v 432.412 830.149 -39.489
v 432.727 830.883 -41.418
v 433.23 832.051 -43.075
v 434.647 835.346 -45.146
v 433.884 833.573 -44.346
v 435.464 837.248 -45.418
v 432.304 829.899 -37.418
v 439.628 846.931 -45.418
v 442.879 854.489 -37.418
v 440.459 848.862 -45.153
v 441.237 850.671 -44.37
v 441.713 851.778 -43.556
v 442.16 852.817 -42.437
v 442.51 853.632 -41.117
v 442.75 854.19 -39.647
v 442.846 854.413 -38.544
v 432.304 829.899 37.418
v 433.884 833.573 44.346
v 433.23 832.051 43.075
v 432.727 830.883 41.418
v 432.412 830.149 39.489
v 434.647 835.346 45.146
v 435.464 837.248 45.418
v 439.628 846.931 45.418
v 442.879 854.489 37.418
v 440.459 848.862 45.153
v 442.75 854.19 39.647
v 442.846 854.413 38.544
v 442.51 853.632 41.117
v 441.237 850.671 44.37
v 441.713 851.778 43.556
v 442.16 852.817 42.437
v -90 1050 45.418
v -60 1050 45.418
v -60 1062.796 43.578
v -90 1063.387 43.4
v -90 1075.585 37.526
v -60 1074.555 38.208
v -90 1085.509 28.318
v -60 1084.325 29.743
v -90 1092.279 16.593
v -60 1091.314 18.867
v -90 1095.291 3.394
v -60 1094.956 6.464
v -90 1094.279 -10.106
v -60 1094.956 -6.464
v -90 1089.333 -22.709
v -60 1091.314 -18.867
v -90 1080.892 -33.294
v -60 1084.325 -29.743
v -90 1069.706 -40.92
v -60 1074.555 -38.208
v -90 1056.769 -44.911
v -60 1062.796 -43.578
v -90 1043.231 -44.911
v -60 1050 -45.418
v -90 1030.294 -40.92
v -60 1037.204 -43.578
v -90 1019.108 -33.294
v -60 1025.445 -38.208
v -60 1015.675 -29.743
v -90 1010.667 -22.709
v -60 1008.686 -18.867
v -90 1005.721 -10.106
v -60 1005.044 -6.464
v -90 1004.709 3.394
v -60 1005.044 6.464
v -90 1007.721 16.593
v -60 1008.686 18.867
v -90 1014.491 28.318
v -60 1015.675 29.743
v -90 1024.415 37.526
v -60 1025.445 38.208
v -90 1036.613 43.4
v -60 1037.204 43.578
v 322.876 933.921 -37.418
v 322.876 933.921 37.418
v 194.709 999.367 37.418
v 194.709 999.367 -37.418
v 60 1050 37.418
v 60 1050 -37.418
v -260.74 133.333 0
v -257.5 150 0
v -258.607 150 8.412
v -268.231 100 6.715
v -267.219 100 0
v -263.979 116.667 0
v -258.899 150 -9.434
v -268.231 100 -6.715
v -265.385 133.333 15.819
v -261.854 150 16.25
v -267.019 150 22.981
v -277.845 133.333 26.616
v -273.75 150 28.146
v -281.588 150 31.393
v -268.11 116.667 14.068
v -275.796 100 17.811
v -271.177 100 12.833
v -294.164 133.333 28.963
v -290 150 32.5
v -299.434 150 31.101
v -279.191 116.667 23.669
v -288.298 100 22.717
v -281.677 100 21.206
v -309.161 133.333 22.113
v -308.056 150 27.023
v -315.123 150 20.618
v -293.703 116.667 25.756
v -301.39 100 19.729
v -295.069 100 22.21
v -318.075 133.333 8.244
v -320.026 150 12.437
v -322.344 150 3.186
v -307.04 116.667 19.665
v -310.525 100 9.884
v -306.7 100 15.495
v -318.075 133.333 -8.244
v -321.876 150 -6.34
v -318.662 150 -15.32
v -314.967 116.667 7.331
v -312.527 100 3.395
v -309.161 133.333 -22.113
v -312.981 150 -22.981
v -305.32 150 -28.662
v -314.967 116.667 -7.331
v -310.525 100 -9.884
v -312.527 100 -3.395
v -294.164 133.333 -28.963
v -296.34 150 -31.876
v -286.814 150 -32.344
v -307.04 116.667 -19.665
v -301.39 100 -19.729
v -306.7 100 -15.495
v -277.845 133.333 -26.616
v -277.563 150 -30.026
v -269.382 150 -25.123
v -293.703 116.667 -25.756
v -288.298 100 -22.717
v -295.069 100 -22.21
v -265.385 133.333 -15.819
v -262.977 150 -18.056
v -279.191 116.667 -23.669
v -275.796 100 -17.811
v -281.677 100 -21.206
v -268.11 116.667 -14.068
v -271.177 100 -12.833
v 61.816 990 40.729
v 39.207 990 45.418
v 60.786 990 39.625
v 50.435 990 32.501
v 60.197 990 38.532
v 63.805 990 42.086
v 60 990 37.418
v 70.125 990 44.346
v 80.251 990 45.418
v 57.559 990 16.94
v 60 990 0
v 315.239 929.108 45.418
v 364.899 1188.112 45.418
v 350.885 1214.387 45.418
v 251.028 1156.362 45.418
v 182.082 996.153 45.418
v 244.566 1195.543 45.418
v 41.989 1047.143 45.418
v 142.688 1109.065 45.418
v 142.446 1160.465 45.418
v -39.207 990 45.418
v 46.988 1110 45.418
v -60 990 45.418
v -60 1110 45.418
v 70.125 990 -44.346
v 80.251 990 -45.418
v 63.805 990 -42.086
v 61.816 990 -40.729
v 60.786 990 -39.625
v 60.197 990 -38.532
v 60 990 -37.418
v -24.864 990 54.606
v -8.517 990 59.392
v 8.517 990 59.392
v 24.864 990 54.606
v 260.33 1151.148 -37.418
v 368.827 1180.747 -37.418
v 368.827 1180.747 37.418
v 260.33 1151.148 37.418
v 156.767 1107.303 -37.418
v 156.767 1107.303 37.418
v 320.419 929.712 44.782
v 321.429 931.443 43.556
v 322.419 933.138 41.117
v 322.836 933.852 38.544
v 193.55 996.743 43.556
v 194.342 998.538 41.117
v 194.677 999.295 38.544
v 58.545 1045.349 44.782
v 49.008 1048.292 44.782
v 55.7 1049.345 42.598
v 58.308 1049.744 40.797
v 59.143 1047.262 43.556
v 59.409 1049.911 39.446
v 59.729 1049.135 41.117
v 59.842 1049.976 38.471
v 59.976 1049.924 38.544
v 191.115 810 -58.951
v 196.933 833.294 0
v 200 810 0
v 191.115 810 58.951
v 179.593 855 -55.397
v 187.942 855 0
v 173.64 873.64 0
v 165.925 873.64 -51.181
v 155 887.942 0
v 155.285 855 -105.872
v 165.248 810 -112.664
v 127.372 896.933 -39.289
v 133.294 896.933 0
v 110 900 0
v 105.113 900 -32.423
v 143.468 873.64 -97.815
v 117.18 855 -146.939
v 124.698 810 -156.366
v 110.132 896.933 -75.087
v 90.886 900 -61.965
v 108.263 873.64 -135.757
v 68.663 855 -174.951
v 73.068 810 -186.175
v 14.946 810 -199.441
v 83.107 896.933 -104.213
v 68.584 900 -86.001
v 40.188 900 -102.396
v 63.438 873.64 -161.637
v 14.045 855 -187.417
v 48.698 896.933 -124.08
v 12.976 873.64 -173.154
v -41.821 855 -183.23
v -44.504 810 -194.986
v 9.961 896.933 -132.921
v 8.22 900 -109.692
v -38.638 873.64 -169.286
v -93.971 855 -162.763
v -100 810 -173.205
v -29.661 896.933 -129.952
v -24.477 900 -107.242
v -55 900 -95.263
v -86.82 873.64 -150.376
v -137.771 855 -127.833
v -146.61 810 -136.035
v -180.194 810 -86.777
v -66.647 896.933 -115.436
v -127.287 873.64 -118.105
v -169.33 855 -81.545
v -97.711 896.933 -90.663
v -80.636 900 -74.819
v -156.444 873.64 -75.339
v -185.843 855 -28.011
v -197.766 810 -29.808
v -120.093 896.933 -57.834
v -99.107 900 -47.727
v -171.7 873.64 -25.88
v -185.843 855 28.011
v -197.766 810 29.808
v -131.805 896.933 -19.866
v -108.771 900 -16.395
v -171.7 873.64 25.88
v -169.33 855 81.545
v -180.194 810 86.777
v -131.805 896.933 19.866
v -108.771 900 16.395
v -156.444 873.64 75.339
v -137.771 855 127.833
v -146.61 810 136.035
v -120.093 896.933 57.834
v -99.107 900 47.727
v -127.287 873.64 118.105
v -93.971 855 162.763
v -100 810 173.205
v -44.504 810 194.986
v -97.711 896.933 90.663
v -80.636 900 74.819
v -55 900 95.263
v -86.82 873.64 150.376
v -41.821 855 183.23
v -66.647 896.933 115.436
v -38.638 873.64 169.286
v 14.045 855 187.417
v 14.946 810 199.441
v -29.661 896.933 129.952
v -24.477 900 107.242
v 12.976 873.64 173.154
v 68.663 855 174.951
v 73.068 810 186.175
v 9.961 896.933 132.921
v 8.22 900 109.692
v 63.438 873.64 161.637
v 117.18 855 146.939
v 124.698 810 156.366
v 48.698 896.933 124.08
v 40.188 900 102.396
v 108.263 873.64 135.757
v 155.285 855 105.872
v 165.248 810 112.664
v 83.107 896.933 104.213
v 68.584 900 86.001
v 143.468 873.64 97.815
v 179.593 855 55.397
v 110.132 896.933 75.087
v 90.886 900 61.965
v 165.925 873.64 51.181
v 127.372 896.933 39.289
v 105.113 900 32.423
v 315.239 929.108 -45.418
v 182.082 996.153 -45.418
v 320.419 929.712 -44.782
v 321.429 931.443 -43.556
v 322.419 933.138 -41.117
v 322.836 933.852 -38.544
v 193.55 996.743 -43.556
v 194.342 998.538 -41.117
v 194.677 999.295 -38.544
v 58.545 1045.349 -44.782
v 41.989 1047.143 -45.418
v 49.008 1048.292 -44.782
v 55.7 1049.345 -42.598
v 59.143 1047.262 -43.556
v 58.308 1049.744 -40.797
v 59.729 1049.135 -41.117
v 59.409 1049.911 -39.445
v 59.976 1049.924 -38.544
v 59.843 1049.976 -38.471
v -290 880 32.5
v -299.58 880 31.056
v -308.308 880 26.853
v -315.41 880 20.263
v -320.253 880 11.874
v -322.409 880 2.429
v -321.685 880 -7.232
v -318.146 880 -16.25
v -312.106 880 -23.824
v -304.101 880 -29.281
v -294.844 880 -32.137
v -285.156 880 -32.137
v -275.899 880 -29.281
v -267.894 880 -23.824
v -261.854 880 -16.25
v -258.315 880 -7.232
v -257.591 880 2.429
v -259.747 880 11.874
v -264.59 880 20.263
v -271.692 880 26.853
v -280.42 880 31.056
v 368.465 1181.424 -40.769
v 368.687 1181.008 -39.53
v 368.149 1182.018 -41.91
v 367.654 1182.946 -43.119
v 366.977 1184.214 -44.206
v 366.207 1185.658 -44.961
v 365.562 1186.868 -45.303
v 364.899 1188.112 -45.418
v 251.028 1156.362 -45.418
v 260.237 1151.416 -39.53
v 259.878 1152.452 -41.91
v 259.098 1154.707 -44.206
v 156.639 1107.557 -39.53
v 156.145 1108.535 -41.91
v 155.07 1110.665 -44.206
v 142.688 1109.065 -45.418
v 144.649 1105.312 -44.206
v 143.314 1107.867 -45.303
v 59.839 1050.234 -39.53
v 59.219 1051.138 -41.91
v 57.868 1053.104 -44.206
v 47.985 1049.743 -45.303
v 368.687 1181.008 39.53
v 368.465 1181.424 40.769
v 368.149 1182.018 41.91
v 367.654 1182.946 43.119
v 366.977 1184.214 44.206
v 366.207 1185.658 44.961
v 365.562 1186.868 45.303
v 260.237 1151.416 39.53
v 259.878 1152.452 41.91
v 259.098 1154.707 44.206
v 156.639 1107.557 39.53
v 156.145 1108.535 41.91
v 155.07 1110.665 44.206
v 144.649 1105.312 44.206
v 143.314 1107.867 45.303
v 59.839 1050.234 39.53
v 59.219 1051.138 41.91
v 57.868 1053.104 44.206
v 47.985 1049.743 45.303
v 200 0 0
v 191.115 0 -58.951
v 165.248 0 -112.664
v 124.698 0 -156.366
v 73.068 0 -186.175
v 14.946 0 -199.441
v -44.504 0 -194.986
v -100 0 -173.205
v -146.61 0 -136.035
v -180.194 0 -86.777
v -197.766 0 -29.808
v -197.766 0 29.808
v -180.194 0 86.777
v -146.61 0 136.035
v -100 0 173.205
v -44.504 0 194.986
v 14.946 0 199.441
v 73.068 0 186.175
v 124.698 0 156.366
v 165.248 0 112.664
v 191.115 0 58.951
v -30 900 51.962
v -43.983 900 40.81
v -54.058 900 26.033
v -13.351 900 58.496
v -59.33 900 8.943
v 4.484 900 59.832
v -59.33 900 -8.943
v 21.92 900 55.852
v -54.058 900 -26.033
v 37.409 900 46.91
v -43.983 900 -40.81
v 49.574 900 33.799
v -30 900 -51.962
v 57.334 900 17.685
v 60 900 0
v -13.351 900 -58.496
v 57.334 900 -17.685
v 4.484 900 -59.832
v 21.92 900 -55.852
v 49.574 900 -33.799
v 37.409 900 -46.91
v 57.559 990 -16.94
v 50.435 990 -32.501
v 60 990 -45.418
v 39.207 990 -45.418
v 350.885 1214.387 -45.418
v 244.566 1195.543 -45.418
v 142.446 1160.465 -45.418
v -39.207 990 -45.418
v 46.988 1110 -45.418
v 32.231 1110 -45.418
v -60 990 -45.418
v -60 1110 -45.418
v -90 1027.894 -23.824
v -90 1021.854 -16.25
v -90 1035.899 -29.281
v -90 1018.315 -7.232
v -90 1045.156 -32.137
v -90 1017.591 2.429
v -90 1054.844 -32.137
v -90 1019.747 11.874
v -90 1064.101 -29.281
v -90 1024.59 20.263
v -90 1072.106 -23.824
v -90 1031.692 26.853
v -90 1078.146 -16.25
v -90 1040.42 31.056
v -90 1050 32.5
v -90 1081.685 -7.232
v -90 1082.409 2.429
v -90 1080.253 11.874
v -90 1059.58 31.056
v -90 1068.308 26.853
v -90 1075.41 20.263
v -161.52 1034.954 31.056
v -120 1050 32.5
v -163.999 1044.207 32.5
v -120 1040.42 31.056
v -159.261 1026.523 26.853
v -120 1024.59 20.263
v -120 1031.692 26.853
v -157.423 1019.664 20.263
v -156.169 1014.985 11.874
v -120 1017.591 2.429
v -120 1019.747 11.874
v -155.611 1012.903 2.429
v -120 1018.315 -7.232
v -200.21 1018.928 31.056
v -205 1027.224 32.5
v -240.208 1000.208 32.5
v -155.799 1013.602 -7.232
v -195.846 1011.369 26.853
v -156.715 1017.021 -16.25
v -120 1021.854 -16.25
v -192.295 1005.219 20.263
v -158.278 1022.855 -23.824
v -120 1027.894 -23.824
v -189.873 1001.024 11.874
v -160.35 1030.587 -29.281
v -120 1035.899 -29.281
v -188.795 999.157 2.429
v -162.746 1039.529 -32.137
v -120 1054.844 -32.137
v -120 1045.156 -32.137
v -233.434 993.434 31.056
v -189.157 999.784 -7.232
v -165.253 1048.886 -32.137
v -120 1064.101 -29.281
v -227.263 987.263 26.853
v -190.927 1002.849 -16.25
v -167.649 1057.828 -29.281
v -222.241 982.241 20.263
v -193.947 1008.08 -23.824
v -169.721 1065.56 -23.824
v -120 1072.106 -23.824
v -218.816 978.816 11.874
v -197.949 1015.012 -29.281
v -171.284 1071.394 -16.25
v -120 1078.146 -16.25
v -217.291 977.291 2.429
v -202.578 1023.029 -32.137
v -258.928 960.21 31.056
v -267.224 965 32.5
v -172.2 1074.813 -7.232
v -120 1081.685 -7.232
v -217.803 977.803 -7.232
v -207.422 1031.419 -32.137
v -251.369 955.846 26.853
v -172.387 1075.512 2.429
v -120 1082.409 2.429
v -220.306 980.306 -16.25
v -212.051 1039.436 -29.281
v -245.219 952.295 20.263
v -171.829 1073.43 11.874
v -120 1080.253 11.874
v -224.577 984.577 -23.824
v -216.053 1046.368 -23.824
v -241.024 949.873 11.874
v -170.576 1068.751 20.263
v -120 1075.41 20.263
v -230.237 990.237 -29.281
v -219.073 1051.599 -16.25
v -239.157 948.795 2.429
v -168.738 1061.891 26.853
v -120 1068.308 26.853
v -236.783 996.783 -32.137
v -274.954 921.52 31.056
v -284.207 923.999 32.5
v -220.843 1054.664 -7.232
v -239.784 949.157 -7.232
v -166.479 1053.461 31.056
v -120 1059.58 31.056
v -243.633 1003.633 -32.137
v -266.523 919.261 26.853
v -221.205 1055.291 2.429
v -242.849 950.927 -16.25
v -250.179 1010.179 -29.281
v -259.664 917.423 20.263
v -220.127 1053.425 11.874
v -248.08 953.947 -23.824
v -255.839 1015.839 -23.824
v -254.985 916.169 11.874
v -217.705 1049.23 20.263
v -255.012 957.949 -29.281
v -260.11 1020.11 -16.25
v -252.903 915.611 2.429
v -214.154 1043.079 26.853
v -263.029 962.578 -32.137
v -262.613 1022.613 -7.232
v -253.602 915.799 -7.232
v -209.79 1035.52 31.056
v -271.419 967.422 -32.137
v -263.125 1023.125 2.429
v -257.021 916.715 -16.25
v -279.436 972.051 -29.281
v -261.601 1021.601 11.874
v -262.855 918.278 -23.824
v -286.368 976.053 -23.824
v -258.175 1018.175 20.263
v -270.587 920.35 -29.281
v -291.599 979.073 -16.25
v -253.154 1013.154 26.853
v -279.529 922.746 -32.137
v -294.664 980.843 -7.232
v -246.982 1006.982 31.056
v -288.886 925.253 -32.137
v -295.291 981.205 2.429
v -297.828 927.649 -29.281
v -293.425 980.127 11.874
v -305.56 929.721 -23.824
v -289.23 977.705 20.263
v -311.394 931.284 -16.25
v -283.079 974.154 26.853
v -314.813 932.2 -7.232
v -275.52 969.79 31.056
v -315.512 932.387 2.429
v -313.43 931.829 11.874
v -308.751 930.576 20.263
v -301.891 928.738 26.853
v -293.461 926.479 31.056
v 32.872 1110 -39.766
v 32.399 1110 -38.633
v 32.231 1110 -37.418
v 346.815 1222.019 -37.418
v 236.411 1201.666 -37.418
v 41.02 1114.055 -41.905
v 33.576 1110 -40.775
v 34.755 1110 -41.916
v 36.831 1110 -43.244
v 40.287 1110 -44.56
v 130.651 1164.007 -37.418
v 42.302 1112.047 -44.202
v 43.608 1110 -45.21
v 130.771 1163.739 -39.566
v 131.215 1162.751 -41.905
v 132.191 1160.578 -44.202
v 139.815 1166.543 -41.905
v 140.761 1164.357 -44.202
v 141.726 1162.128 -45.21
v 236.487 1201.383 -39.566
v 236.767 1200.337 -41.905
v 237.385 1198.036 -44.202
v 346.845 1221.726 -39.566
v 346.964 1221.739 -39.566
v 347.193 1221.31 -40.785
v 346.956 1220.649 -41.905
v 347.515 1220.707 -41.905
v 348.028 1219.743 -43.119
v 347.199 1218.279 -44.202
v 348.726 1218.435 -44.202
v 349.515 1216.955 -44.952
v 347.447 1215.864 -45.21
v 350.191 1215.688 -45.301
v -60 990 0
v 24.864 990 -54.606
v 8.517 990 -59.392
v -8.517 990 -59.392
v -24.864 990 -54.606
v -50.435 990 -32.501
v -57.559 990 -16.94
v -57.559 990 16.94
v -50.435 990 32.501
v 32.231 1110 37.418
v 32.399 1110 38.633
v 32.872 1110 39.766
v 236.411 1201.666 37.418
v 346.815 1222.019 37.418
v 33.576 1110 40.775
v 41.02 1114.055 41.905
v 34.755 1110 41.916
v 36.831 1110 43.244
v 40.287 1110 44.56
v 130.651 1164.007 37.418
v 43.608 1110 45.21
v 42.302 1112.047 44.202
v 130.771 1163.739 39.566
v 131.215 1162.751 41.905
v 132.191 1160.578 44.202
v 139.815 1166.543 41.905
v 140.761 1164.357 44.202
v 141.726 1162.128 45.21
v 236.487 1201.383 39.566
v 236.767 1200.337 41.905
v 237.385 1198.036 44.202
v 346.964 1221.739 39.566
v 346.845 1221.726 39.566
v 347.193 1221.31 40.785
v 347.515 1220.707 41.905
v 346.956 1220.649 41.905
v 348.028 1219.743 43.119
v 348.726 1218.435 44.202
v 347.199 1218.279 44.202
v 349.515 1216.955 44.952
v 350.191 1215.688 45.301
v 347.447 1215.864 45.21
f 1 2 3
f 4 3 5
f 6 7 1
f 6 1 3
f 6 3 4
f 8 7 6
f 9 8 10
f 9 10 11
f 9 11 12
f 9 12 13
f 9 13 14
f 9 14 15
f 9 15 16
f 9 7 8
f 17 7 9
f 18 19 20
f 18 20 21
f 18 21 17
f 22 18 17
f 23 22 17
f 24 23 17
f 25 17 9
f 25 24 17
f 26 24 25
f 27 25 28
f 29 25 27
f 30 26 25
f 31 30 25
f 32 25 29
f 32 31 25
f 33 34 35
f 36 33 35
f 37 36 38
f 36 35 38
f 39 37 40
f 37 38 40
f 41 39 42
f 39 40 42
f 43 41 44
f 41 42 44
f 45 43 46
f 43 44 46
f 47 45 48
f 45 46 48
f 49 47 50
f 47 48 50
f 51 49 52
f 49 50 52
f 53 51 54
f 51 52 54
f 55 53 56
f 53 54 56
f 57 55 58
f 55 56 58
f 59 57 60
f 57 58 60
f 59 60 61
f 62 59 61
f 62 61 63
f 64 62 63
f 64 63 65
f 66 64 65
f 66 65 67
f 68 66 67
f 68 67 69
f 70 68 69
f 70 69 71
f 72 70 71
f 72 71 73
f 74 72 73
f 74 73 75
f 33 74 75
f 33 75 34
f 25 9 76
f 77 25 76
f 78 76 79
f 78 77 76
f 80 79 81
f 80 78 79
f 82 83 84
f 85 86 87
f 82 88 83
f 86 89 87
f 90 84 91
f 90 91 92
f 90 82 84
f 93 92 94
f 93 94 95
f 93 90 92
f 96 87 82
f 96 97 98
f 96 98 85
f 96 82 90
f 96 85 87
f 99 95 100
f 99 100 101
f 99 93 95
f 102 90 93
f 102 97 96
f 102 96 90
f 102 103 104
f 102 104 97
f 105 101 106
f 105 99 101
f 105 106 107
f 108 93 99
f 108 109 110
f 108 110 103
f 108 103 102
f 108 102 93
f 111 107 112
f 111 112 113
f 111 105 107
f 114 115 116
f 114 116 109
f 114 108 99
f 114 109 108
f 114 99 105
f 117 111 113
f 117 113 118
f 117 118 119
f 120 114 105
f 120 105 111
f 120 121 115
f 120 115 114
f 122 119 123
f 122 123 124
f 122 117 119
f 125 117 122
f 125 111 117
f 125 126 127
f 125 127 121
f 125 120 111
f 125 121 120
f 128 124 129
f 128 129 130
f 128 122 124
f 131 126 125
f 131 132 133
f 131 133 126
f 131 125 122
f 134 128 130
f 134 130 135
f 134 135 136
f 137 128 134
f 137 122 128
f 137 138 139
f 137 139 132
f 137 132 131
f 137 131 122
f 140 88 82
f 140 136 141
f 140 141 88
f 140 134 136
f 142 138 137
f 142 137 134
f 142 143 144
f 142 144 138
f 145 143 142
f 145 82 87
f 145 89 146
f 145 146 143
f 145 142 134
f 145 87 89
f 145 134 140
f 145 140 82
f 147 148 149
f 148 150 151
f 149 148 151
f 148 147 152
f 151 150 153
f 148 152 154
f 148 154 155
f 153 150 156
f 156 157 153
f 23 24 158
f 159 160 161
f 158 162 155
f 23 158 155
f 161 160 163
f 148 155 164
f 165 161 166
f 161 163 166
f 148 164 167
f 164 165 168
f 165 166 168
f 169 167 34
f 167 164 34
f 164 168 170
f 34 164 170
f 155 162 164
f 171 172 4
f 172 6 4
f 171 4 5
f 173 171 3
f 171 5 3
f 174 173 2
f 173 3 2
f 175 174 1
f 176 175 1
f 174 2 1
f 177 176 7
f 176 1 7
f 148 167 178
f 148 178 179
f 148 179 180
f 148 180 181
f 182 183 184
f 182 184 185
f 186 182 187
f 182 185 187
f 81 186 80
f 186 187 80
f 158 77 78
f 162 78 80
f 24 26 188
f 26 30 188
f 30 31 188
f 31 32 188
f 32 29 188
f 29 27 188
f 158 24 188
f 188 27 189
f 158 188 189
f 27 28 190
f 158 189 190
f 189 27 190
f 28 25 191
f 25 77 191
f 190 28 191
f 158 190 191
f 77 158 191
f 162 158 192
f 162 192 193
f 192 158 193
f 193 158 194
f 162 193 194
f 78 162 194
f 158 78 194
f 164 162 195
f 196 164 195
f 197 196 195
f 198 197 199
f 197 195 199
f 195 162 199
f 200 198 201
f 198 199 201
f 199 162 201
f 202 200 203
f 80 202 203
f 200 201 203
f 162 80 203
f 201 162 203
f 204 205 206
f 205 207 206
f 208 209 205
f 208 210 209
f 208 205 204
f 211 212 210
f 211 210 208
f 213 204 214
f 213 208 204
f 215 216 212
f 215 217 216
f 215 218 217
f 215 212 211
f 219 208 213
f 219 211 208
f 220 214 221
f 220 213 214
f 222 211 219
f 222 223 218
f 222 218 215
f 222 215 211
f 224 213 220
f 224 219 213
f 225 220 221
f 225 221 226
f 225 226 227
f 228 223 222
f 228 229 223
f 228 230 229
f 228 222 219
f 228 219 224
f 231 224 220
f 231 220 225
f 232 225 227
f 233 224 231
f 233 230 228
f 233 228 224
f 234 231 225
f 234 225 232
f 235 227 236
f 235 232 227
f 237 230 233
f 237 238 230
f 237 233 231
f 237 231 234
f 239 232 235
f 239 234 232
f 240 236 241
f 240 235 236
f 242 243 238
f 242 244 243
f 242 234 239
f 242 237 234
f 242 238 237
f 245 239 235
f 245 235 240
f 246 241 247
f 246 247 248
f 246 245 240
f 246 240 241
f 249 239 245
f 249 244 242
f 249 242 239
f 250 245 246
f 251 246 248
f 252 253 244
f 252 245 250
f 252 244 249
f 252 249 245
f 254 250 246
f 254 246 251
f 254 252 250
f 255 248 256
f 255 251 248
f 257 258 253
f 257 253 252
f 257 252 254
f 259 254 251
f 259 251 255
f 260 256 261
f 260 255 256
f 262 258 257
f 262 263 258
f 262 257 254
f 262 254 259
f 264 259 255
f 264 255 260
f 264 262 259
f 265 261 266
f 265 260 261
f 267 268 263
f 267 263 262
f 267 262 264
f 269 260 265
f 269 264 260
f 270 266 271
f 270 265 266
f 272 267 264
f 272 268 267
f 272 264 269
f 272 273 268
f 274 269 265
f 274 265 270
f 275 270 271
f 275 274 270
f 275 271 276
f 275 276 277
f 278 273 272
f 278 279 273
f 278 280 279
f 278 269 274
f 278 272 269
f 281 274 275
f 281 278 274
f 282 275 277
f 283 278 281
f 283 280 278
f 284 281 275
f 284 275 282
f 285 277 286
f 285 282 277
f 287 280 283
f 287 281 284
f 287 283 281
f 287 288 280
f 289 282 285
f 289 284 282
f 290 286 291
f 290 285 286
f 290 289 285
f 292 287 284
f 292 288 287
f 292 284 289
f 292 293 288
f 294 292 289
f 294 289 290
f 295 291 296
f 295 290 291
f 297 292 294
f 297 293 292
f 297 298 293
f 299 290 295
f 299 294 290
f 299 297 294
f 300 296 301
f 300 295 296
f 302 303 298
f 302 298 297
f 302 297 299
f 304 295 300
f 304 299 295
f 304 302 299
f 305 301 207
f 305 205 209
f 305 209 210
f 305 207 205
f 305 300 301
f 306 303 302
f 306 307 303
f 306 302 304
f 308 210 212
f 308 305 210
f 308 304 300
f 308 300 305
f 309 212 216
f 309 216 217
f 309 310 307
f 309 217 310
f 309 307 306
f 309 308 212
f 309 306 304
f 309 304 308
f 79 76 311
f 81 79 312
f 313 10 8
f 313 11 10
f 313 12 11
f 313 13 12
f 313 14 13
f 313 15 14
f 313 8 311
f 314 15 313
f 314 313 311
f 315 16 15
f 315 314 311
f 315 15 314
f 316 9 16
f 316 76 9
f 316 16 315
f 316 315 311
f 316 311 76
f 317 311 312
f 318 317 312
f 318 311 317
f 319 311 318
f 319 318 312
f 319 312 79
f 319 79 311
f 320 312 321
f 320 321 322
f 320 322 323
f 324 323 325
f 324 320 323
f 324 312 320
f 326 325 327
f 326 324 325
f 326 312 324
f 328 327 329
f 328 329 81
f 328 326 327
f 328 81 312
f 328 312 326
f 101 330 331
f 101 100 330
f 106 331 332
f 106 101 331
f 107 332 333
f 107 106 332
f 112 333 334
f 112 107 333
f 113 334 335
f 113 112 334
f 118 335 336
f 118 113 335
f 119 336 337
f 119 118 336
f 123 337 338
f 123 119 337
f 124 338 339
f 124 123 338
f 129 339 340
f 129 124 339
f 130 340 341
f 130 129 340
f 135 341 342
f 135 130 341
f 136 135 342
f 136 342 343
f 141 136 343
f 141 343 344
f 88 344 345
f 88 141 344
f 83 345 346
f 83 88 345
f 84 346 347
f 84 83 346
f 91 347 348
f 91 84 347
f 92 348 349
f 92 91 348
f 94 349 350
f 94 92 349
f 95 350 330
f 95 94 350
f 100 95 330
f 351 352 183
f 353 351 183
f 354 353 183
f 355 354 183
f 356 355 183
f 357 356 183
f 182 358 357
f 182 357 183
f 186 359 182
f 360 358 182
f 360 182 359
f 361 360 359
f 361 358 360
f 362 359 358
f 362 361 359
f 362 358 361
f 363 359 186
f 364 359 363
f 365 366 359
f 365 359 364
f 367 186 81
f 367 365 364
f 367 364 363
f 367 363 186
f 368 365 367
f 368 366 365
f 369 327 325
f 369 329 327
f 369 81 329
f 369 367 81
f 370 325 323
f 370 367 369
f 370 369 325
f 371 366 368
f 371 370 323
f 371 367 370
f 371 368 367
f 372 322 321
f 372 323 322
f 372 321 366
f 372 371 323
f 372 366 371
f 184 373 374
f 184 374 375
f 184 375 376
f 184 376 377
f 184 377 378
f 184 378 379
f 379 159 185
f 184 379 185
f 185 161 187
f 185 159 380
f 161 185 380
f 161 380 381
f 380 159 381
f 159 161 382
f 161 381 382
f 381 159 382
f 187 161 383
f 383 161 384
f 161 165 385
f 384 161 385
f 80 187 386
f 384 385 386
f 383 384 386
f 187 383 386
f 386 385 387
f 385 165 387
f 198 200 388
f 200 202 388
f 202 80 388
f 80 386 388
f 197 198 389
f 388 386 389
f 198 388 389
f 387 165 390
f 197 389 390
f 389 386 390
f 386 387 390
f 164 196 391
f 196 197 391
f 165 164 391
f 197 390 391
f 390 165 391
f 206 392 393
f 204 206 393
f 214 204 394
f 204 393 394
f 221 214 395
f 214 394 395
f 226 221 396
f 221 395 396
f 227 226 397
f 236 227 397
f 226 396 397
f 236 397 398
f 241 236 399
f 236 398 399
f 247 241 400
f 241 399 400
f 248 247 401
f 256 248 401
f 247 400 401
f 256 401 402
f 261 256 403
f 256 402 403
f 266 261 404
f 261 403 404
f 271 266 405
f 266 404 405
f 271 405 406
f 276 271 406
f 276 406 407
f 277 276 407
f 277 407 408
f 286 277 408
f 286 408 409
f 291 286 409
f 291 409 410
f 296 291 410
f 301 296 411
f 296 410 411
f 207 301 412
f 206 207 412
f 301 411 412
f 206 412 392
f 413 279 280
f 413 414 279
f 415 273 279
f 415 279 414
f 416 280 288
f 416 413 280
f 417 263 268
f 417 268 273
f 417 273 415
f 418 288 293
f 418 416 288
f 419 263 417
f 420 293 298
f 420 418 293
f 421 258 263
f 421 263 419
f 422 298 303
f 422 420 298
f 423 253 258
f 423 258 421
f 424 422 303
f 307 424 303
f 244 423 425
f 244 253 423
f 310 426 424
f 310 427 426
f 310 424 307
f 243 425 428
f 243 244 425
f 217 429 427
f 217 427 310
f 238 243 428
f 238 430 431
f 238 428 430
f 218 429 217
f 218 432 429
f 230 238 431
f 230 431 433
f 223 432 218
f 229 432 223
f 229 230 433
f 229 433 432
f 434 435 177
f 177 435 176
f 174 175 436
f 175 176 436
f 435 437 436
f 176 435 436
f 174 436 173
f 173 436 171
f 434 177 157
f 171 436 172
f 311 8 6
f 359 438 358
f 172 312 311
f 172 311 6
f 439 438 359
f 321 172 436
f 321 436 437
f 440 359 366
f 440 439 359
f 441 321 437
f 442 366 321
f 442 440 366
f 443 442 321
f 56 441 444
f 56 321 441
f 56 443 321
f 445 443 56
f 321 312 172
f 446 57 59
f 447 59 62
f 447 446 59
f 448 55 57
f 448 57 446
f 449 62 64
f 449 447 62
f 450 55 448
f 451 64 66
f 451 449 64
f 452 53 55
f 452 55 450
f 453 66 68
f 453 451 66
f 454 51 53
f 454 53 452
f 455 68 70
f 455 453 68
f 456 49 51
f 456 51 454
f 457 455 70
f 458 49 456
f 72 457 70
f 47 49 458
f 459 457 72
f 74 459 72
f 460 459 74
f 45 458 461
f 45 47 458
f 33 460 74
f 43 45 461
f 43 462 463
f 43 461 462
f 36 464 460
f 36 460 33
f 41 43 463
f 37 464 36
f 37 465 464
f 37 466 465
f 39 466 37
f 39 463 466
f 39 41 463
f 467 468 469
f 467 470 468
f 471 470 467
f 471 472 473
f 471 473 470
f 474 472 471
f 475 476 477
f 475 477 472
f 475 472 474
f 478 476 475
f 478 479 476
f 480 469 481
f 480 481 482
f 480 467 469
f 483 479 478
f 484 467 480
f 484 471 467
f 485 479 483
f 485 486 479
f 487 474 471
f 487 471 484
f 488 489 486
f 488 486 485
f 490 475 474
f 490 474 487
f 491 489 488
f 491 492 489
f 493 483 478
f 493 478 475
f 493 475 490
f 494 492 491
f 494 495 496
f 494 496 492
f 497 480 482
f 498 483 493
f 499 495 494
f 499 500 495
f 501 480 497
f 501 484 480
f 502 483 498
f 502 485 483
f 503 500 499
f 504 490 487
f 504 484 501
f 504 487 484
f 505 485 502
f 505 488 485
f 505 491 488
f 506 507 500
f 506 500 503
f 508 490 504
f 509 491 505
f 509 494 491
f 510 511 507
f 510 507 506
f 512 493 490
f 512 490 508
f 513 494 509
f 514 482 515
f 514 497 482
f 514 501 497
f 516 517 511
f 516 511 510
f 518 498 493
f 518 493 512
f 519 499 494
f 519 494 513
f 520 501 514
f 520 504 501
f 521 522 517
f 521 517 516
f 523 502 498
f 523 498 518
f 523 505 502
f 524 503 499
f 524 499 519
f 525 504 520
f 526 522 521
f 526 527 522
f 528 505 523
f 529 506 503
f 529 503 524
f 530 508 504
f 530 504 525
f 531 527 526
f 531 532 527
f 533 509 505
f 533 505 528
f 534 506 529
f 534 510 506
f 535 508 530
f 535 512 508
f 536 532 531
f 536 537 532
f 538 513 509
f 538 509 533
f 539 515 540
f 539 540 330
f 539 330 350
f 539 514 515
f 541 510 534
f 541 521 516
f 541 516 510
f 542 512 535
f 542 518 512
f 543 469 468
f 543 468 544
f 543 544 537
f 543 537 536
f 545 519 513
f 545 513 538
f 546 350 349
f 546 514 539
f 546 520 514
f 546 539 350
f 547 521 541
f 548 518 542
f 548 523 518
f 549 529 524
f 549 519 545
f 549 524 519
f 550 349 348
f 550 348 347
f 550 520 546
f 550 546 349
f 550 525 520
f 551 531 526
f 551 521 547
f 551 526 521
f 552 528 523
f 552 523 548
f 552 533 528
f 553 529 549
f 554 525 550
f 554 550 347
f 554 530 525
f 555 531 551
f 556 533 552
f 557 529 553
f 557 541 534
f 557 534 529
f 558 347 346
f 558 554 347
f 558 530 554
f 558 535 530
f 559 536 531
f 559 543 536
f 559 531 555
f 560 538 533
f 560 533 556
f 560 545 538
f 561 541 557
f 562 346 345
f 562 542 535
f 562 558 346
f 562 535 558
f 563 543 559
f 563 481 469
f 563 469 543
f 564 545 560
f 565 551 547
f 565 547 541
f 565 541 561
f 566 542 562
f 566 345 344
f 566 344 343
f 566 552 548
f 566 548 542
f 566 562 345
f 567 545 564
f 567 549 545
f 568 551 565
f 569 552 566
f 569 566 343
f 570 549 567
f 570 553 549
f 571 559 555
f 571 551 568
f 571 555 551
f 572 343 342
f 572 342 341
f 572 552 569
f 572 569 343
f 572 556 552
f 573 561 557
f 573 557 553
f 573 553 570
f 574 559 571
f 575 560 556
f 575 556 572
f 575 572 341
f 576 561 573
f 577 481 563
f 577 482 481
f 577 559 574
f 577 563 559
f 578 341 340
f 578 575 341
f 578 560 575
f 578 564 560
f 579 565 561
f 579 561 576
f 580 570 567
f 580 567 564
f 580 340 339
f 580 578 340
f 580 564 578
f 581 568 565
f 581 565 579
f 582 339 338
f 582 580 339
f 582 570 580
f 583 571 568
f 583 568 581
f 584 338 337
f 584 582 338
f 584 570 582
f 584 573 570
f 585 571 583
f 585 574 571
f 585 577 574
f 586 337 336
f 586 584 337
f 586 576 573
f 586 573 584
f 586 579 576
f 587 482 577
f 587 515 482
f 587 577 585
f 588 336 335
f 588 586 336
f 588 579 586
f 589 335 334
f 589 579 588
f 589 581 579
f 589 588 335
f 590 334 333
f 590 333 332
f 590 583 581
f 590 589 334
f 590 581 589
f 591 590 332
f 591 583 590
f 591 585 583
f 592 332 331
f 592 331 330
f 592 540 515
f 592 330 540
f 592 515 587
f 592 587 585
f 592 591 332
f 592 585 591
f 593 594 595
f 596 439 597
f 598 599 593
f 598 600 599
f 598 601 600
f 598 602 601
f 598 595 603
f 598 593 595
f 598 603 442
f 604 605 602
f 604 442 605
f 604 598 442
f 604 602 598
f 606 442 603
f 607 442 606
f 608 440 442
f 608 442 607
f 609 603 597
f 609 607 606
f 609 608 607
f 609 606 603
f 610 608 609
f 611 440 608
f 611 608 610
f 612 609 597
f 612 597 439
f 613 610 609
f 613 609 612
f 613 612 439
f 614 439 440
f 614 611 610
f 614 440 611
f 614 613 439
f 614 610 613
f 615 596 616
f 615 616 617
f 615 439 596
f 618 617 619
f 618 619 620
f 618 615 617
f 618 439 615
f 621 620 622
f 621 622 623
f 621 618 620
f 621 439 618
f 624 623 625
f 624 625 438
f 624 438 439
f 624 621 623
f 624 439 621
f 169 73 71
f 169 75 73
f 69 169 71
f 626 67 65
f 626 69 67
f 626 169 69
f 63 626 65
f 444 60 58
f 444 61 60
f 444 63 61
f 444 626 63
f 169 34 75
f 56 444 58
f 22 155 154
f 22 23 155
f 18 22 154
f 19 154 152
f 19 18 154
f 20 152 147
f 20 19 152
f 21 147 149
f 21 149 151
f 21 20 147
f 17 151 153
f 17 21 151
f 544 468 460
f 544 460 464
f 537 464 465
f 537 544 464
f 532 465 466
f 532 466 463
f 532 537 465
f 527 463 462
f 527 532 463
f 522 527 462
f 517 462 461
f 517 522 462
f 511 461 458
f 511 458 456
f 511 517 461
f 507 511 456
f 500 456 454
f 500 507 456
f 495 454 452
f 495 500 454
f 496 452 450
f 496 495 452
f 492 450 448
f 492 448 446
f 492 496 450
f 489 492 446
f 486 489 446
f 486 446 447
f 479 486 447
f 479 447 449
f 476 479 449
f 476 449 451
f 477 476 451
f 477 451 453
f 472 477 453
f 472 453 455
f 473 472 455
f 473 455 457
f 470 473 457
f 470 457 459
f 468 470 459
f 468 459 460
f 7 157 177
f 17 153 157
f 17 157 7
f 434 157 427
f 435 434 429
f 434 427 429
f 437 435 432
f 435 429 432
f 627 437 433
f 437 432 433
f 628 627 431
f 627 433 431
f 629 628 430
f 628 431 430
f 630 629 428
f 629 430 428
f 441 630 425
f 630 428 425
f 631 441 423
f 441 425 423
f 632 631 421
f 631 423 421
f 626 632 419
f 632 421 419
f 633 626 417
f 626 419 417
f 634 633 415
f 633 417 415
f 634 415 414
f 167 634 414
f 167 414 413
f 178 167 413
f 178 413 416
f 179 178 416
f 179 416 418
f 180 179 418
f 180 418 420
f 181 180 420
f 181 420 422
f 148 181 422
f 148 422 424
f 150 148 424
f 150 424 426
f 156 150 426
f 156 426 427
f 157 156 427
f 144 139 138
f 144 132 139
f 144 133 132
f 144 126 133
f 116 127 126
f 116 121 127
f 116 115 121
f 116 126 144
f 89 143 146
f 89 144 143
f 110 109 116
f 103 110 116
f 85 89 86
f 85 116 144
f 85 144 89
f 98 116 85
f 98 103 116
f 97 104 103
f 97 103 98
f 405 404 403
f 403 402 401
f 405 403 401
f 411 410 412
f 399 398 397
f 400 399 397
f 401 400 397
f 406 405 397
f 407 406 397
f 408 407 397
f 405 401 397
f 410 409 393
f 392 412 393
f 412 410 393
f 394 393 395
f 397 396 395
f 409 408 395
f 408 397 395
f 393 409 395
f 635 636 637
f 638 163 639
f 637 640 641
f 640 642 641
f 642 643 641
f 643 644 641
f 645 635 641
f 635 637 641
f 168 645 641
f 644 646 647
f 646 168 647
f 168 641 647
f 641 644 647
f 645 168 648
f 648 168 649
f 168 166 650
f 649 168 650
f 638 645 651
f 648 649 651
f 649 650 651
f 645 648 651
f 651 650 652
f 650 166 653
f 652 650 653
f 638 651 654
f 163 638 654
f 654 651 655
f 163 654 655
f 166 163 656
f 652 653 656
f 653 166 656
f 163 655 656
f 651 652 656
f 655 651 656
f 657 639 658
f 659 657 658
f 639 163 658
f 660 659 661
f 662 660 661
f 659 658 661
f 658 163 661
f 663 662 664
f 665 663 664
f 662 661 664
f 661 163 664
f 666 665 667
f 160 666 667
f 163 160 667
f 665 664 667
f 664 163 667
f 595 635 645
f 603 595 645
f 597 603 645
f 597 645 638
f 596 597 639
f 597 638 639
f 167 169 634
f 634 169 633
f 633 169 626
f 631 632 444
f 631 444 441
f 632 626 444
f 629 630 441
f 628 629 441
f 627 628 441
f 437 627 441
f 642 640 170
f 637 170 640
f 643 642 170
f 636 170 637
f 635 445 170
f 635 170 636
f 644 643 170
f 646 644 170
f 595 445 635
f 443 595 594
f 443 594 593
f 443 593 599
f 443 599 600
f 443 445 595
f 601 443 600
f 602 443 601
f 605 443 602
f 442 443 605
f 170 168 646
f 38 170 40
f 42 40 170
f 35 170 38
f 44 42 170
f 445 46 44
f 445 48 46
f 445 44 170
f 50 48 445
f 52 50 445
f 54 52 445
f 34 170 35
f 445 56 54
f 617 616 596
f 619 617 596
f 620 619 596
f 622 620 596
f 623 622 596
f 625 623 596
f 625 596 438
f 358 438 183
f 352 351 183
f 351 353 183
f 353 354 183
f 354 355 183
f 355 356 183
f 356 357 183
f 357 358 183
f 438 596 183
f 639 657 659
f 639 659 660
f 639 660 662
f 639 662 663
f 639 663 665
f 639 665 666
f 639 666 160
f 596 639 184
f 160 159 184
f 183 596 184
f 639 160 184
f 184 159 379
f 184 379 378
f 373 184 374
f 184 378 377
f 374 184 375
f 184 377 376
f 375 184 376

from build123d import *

# Parameters (mm, degrees)
CROQUIS1_R              = 200
SALIENTE_EXTRUIR1_DEPTH = 900
REDONDEO1_R             = 90
CROQUIS2_R              = 60
SALIENTE_EXTRUIR2_DEPTH = 90
CROQUIS3_W              = 120
CROQUIS3_H              = 90.836251912
SALIENTE_EXTRUIR3_DEPTH = 60
SALIENTE_EXTRUIR4_DEPTH = 90.836252
CROQUIS5_W              = 120
CROQUIS5_H              = 90.836251912
SALIENTE_EXTRUIR5_DEPTH = 60
SALIENTE_EXTRUIR6_DEPTH = 90.836252
REDONDEO2_R             = 8
CROQUIS8_R              = 45.418125956
SALIENTE_EXTRUIR7_DEPTH = 30
CROQUIS9_R              = 32.5
CROQUIS10_R             = 32.5
SALIENTE_EXTRUIR8_DEPTH = 50
SALIENTE_EXTRUIR8_TAPER = 11


with BuildPart() as part:
    # Croquis1 → Saliente-Extruir1 (new body)
    with BuildSketch(Plane(origin=(0, 0, 0), x_dir=(1, 0, 0), z_dir=(0, 1, 0))):
        Circle(CROQUIS1_R)
    extrude(amount=SALIENTE_EXTRUIR1_DEPTH)

    # Redondeo1
    redondeo1_edges = [part.edges().sort_by_distance(p)[0] for p in [
        (-200, 900, 0),
    ]]
    fillet(redondeo1_edges, radius=REDONDEO1_R)

    # Croquis2 → Saliente-Extruir2 (add)
    with BuildSketch(Plane(origin=(0, 900, 0), x_dir=(1, 0, 0), z_dir=(0, 1, 0))):
        Circle(CROQUIS2_R)
    extrude(amount=SALIENTE_EXTRUIR2_DEPTH)

    # Croquis3 → Saliente-Extruir3 (add)
    with BuildSketch(Plane(origin=(0, 990, 0), x_dir=(1, 0, 0), z_dir=(0, 1, 0))):
        Rectangle(CROQUIS3_W, CROQUIS3_H)
    extrude(amount=SALIENTE_EXTRUIR3_DEPTH)

    # Croquis4 → Saliente-Extruir4 (add)
    with BuildSketch(Plane.XY.offset(45.418125956)):
        with BuildLine():
            Line((60, 990), (432.304083803, 829.898605595))
            Line((432.304083803, 829.898605595), (442.878538819, 854.488727381))
            ThreePointArc((442.878538819, 854.488727381), (259.713592606, 968.448343813), (60, 1050))
            Line((60, 1050), (60, 990))
        make_face()
    extrude(amount=-SALIENTE_EXTRUIR4_DEPTH)

    # Croquis5 → Saliente-Extruir5 (add)
    with BuildSketch(Plane(origin=(0, 1050, 0), x_dir=(1, 0, 0), z_dir=(0, 1, 0))):
        Rectangle(CROQUIS5_W, CROQUIS5_H)
    extrude(amount=SALIENTE_EXTRUIR5_DEPTH)

    # Croquis6 → Saliente-Extruir6 (add)
    with BuildSketch(Plane.XY.offset(45.418125956)):
        with BuildLine():
            Line((346.814814122, 1222.018811659), (368.82653308, 1180.746838612))
            ThreePointArc((368.82653308, 1180.746838612), (207.813070235, 1130.963209195), (60, 1050))
            Line((60, 1050), (60, 1110))
            Line((60, 1110), (32.230664011, 1110))
            ThreePointArc((32.230664011, 1110), (182.778174474, 1184.950270214), (346.814814122, 1222.018811659))
        make_face()
    extrude(amount=-SALIENTE_EXTRUIR6_DEPTH)

    # Redondeo2
    redondeo2_edges = [part.edges().sort_by_distance(p)[0] for p in [
        (246.152041901, 909.949302798, 45.418125956),
        (259.713592606, 968.448343813, 45.418125956),
        (259.713592606, 968.448343813, -45.418126044),
        (246.152041901, 909.949302798, -45.418126044),
        (207.813070235, 1130.963209195, 45.418125956),
        (182.778174474, 1184.950270214, 45.418125956),
        (207.813070235, 1130.963209195, -45.418126044),
        (182.778174474, 1184.950270214, -45.418126044),
    ]]
    fillet(redondeo2_edges, radius=REDONDEO2_R)

    # Croquis8 → Saliente-Extruir7 (add)
    with BuildSketch(Plane.ZY.offset(60)):
        with Locations((0, 1050)):
            Circle(CROQUIS8_R)
    extrude(amount=SALIENTE_EXTRUIR7_DEPTH)

    # Barrer1: sweep along a curve in space
    with BuildLine() as barrer1_path:
        Line((-90, 1050, 0), (-120, 1050, 0))
        ThreePointArc((-120, 1050, 0), (-240.208152802, 1000.208152802, 0), (-290, 880, 0))
        Line((-290, 880, 0), (-290, 150, 0))
    # Croquis9 → Barrer1 (sweep)
    with BuildSketch(Plane.ZY.offset(90)):
        with Locations((0, 1050)):
            Circle(CROQUIS9_R)
    sweep(path=barrer1_path.line)

    # Croquis10 → Saliente-Extruir8 (add)
    with BuildSketch(Plane.XZ.offset(-150)):
        with Locations((-290, 0)):
            Circle(CROQUIS10_R)
    extrude(amount=SALIENTE_EXTRUIR8_DEPTH, taper=SALIENTE_EXTRUIR8_TAPER)


solid = part.part
